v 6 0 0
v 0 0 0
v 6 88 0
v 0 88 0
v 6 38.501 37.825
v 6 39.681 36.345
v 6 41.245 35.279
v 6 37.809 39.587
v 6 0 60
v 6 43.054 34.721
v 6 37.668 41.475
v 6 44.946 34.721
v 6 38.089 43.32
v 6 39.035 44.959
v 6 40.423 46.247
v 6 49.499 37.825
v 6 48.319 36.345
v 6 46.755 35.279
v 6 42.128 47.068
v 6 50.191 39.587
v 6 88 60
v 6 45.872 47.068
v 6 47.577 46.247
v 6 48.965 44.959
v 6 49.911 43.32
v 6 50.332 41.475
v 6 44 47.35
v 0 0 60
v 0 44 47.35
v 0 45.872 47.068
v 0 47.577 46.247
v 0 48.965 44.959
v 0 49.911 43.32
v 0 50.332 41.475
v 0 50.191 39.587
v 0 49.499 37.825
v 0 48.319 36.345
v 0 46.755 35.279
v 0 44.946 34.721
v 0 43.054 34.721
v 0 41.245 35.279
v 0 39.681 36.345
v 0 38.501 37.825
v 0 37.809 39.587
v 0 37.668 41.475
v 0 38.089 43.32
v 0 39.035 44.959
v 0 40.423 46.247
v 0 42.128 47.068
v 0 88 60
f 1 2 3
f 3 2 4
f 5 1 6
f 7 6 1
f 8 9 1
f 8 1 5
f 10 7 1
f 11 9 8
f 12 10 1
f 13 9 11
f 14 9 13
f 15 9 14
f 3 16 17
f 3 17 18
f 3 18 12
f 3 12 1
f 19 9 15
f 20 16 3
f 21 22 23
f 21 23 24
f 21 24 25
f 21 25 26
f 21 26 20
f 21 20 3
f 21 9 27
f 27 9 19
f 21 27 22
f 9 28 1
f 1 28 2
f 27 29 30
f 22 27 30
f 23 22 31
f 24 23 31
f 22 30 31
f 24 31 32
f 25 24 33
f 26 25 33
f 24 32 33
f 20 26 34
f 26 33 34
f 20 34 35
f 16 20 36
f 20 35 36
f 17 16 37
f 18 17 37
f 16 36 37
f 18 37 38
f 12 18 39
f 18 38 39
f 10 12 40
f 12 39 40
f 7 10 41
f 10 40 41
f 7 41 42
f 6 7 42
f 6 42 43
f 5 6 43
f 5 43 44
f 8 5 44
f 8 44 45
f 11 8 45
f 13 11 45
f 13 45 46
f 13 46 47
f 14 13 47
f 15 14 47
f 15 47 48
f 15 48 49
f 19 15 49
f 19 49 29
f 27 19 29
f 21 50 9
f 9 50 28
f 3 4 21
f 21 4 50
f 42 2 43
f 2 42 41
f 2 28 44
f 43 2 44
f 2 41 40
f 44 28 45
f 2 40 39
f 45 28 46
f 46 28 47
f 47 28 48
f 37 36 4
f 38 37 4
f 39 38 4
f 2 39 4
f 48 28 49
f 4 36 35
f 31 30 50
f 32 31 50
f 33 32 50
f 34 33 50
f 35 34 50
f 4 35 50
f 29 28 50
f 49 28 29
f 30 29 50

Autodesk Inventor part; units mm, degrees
ref_plane "YZ Plane" through (0, 0, 0) normal (1, 0, 0) x (0, 1, 0)
ref_plane "XZ Plane" through (0, 0, 0) normal (0, 1, 0) x (-1, 0, 0)
ref_plane "XY Plane" through (0, 0, 0) normal (0, 0, 1) x (1, 0, 0)
sketch "Sketch1" plane through (0, 0, 0) normal (1, 0, 0) x (0, 1, 0)
  line L0 (0, 0) -> (88, 0)
  line L1 (88, 0) -> (88, 60)
  line L2 (88, 60) -> (0, 60)
  line L3 (0, 60) -> (0, 0)
  dimension "d0" = 88
  dimension "d1" = 60
extrude "Extrusion1" add sketch "Sketch1" along normal blind 6
sketch "Sketch2" plane through (0, 0, 0) normal (-1, 0, 0) x (0, 0, 1)
  line L0 (60, 0) -> (0, 0) projected
  line L1 (0, 0) -> (0, 88) projected
  circle A0 centre (41, 44) radius 6.35
  dimension "d4" = 44
  dimension "d5" = 41
  dimension "d6" = 12.7
extrude "Extrusion2" cut sketch "Sketch2" against normal blind 6
properties part number "motor_base"
